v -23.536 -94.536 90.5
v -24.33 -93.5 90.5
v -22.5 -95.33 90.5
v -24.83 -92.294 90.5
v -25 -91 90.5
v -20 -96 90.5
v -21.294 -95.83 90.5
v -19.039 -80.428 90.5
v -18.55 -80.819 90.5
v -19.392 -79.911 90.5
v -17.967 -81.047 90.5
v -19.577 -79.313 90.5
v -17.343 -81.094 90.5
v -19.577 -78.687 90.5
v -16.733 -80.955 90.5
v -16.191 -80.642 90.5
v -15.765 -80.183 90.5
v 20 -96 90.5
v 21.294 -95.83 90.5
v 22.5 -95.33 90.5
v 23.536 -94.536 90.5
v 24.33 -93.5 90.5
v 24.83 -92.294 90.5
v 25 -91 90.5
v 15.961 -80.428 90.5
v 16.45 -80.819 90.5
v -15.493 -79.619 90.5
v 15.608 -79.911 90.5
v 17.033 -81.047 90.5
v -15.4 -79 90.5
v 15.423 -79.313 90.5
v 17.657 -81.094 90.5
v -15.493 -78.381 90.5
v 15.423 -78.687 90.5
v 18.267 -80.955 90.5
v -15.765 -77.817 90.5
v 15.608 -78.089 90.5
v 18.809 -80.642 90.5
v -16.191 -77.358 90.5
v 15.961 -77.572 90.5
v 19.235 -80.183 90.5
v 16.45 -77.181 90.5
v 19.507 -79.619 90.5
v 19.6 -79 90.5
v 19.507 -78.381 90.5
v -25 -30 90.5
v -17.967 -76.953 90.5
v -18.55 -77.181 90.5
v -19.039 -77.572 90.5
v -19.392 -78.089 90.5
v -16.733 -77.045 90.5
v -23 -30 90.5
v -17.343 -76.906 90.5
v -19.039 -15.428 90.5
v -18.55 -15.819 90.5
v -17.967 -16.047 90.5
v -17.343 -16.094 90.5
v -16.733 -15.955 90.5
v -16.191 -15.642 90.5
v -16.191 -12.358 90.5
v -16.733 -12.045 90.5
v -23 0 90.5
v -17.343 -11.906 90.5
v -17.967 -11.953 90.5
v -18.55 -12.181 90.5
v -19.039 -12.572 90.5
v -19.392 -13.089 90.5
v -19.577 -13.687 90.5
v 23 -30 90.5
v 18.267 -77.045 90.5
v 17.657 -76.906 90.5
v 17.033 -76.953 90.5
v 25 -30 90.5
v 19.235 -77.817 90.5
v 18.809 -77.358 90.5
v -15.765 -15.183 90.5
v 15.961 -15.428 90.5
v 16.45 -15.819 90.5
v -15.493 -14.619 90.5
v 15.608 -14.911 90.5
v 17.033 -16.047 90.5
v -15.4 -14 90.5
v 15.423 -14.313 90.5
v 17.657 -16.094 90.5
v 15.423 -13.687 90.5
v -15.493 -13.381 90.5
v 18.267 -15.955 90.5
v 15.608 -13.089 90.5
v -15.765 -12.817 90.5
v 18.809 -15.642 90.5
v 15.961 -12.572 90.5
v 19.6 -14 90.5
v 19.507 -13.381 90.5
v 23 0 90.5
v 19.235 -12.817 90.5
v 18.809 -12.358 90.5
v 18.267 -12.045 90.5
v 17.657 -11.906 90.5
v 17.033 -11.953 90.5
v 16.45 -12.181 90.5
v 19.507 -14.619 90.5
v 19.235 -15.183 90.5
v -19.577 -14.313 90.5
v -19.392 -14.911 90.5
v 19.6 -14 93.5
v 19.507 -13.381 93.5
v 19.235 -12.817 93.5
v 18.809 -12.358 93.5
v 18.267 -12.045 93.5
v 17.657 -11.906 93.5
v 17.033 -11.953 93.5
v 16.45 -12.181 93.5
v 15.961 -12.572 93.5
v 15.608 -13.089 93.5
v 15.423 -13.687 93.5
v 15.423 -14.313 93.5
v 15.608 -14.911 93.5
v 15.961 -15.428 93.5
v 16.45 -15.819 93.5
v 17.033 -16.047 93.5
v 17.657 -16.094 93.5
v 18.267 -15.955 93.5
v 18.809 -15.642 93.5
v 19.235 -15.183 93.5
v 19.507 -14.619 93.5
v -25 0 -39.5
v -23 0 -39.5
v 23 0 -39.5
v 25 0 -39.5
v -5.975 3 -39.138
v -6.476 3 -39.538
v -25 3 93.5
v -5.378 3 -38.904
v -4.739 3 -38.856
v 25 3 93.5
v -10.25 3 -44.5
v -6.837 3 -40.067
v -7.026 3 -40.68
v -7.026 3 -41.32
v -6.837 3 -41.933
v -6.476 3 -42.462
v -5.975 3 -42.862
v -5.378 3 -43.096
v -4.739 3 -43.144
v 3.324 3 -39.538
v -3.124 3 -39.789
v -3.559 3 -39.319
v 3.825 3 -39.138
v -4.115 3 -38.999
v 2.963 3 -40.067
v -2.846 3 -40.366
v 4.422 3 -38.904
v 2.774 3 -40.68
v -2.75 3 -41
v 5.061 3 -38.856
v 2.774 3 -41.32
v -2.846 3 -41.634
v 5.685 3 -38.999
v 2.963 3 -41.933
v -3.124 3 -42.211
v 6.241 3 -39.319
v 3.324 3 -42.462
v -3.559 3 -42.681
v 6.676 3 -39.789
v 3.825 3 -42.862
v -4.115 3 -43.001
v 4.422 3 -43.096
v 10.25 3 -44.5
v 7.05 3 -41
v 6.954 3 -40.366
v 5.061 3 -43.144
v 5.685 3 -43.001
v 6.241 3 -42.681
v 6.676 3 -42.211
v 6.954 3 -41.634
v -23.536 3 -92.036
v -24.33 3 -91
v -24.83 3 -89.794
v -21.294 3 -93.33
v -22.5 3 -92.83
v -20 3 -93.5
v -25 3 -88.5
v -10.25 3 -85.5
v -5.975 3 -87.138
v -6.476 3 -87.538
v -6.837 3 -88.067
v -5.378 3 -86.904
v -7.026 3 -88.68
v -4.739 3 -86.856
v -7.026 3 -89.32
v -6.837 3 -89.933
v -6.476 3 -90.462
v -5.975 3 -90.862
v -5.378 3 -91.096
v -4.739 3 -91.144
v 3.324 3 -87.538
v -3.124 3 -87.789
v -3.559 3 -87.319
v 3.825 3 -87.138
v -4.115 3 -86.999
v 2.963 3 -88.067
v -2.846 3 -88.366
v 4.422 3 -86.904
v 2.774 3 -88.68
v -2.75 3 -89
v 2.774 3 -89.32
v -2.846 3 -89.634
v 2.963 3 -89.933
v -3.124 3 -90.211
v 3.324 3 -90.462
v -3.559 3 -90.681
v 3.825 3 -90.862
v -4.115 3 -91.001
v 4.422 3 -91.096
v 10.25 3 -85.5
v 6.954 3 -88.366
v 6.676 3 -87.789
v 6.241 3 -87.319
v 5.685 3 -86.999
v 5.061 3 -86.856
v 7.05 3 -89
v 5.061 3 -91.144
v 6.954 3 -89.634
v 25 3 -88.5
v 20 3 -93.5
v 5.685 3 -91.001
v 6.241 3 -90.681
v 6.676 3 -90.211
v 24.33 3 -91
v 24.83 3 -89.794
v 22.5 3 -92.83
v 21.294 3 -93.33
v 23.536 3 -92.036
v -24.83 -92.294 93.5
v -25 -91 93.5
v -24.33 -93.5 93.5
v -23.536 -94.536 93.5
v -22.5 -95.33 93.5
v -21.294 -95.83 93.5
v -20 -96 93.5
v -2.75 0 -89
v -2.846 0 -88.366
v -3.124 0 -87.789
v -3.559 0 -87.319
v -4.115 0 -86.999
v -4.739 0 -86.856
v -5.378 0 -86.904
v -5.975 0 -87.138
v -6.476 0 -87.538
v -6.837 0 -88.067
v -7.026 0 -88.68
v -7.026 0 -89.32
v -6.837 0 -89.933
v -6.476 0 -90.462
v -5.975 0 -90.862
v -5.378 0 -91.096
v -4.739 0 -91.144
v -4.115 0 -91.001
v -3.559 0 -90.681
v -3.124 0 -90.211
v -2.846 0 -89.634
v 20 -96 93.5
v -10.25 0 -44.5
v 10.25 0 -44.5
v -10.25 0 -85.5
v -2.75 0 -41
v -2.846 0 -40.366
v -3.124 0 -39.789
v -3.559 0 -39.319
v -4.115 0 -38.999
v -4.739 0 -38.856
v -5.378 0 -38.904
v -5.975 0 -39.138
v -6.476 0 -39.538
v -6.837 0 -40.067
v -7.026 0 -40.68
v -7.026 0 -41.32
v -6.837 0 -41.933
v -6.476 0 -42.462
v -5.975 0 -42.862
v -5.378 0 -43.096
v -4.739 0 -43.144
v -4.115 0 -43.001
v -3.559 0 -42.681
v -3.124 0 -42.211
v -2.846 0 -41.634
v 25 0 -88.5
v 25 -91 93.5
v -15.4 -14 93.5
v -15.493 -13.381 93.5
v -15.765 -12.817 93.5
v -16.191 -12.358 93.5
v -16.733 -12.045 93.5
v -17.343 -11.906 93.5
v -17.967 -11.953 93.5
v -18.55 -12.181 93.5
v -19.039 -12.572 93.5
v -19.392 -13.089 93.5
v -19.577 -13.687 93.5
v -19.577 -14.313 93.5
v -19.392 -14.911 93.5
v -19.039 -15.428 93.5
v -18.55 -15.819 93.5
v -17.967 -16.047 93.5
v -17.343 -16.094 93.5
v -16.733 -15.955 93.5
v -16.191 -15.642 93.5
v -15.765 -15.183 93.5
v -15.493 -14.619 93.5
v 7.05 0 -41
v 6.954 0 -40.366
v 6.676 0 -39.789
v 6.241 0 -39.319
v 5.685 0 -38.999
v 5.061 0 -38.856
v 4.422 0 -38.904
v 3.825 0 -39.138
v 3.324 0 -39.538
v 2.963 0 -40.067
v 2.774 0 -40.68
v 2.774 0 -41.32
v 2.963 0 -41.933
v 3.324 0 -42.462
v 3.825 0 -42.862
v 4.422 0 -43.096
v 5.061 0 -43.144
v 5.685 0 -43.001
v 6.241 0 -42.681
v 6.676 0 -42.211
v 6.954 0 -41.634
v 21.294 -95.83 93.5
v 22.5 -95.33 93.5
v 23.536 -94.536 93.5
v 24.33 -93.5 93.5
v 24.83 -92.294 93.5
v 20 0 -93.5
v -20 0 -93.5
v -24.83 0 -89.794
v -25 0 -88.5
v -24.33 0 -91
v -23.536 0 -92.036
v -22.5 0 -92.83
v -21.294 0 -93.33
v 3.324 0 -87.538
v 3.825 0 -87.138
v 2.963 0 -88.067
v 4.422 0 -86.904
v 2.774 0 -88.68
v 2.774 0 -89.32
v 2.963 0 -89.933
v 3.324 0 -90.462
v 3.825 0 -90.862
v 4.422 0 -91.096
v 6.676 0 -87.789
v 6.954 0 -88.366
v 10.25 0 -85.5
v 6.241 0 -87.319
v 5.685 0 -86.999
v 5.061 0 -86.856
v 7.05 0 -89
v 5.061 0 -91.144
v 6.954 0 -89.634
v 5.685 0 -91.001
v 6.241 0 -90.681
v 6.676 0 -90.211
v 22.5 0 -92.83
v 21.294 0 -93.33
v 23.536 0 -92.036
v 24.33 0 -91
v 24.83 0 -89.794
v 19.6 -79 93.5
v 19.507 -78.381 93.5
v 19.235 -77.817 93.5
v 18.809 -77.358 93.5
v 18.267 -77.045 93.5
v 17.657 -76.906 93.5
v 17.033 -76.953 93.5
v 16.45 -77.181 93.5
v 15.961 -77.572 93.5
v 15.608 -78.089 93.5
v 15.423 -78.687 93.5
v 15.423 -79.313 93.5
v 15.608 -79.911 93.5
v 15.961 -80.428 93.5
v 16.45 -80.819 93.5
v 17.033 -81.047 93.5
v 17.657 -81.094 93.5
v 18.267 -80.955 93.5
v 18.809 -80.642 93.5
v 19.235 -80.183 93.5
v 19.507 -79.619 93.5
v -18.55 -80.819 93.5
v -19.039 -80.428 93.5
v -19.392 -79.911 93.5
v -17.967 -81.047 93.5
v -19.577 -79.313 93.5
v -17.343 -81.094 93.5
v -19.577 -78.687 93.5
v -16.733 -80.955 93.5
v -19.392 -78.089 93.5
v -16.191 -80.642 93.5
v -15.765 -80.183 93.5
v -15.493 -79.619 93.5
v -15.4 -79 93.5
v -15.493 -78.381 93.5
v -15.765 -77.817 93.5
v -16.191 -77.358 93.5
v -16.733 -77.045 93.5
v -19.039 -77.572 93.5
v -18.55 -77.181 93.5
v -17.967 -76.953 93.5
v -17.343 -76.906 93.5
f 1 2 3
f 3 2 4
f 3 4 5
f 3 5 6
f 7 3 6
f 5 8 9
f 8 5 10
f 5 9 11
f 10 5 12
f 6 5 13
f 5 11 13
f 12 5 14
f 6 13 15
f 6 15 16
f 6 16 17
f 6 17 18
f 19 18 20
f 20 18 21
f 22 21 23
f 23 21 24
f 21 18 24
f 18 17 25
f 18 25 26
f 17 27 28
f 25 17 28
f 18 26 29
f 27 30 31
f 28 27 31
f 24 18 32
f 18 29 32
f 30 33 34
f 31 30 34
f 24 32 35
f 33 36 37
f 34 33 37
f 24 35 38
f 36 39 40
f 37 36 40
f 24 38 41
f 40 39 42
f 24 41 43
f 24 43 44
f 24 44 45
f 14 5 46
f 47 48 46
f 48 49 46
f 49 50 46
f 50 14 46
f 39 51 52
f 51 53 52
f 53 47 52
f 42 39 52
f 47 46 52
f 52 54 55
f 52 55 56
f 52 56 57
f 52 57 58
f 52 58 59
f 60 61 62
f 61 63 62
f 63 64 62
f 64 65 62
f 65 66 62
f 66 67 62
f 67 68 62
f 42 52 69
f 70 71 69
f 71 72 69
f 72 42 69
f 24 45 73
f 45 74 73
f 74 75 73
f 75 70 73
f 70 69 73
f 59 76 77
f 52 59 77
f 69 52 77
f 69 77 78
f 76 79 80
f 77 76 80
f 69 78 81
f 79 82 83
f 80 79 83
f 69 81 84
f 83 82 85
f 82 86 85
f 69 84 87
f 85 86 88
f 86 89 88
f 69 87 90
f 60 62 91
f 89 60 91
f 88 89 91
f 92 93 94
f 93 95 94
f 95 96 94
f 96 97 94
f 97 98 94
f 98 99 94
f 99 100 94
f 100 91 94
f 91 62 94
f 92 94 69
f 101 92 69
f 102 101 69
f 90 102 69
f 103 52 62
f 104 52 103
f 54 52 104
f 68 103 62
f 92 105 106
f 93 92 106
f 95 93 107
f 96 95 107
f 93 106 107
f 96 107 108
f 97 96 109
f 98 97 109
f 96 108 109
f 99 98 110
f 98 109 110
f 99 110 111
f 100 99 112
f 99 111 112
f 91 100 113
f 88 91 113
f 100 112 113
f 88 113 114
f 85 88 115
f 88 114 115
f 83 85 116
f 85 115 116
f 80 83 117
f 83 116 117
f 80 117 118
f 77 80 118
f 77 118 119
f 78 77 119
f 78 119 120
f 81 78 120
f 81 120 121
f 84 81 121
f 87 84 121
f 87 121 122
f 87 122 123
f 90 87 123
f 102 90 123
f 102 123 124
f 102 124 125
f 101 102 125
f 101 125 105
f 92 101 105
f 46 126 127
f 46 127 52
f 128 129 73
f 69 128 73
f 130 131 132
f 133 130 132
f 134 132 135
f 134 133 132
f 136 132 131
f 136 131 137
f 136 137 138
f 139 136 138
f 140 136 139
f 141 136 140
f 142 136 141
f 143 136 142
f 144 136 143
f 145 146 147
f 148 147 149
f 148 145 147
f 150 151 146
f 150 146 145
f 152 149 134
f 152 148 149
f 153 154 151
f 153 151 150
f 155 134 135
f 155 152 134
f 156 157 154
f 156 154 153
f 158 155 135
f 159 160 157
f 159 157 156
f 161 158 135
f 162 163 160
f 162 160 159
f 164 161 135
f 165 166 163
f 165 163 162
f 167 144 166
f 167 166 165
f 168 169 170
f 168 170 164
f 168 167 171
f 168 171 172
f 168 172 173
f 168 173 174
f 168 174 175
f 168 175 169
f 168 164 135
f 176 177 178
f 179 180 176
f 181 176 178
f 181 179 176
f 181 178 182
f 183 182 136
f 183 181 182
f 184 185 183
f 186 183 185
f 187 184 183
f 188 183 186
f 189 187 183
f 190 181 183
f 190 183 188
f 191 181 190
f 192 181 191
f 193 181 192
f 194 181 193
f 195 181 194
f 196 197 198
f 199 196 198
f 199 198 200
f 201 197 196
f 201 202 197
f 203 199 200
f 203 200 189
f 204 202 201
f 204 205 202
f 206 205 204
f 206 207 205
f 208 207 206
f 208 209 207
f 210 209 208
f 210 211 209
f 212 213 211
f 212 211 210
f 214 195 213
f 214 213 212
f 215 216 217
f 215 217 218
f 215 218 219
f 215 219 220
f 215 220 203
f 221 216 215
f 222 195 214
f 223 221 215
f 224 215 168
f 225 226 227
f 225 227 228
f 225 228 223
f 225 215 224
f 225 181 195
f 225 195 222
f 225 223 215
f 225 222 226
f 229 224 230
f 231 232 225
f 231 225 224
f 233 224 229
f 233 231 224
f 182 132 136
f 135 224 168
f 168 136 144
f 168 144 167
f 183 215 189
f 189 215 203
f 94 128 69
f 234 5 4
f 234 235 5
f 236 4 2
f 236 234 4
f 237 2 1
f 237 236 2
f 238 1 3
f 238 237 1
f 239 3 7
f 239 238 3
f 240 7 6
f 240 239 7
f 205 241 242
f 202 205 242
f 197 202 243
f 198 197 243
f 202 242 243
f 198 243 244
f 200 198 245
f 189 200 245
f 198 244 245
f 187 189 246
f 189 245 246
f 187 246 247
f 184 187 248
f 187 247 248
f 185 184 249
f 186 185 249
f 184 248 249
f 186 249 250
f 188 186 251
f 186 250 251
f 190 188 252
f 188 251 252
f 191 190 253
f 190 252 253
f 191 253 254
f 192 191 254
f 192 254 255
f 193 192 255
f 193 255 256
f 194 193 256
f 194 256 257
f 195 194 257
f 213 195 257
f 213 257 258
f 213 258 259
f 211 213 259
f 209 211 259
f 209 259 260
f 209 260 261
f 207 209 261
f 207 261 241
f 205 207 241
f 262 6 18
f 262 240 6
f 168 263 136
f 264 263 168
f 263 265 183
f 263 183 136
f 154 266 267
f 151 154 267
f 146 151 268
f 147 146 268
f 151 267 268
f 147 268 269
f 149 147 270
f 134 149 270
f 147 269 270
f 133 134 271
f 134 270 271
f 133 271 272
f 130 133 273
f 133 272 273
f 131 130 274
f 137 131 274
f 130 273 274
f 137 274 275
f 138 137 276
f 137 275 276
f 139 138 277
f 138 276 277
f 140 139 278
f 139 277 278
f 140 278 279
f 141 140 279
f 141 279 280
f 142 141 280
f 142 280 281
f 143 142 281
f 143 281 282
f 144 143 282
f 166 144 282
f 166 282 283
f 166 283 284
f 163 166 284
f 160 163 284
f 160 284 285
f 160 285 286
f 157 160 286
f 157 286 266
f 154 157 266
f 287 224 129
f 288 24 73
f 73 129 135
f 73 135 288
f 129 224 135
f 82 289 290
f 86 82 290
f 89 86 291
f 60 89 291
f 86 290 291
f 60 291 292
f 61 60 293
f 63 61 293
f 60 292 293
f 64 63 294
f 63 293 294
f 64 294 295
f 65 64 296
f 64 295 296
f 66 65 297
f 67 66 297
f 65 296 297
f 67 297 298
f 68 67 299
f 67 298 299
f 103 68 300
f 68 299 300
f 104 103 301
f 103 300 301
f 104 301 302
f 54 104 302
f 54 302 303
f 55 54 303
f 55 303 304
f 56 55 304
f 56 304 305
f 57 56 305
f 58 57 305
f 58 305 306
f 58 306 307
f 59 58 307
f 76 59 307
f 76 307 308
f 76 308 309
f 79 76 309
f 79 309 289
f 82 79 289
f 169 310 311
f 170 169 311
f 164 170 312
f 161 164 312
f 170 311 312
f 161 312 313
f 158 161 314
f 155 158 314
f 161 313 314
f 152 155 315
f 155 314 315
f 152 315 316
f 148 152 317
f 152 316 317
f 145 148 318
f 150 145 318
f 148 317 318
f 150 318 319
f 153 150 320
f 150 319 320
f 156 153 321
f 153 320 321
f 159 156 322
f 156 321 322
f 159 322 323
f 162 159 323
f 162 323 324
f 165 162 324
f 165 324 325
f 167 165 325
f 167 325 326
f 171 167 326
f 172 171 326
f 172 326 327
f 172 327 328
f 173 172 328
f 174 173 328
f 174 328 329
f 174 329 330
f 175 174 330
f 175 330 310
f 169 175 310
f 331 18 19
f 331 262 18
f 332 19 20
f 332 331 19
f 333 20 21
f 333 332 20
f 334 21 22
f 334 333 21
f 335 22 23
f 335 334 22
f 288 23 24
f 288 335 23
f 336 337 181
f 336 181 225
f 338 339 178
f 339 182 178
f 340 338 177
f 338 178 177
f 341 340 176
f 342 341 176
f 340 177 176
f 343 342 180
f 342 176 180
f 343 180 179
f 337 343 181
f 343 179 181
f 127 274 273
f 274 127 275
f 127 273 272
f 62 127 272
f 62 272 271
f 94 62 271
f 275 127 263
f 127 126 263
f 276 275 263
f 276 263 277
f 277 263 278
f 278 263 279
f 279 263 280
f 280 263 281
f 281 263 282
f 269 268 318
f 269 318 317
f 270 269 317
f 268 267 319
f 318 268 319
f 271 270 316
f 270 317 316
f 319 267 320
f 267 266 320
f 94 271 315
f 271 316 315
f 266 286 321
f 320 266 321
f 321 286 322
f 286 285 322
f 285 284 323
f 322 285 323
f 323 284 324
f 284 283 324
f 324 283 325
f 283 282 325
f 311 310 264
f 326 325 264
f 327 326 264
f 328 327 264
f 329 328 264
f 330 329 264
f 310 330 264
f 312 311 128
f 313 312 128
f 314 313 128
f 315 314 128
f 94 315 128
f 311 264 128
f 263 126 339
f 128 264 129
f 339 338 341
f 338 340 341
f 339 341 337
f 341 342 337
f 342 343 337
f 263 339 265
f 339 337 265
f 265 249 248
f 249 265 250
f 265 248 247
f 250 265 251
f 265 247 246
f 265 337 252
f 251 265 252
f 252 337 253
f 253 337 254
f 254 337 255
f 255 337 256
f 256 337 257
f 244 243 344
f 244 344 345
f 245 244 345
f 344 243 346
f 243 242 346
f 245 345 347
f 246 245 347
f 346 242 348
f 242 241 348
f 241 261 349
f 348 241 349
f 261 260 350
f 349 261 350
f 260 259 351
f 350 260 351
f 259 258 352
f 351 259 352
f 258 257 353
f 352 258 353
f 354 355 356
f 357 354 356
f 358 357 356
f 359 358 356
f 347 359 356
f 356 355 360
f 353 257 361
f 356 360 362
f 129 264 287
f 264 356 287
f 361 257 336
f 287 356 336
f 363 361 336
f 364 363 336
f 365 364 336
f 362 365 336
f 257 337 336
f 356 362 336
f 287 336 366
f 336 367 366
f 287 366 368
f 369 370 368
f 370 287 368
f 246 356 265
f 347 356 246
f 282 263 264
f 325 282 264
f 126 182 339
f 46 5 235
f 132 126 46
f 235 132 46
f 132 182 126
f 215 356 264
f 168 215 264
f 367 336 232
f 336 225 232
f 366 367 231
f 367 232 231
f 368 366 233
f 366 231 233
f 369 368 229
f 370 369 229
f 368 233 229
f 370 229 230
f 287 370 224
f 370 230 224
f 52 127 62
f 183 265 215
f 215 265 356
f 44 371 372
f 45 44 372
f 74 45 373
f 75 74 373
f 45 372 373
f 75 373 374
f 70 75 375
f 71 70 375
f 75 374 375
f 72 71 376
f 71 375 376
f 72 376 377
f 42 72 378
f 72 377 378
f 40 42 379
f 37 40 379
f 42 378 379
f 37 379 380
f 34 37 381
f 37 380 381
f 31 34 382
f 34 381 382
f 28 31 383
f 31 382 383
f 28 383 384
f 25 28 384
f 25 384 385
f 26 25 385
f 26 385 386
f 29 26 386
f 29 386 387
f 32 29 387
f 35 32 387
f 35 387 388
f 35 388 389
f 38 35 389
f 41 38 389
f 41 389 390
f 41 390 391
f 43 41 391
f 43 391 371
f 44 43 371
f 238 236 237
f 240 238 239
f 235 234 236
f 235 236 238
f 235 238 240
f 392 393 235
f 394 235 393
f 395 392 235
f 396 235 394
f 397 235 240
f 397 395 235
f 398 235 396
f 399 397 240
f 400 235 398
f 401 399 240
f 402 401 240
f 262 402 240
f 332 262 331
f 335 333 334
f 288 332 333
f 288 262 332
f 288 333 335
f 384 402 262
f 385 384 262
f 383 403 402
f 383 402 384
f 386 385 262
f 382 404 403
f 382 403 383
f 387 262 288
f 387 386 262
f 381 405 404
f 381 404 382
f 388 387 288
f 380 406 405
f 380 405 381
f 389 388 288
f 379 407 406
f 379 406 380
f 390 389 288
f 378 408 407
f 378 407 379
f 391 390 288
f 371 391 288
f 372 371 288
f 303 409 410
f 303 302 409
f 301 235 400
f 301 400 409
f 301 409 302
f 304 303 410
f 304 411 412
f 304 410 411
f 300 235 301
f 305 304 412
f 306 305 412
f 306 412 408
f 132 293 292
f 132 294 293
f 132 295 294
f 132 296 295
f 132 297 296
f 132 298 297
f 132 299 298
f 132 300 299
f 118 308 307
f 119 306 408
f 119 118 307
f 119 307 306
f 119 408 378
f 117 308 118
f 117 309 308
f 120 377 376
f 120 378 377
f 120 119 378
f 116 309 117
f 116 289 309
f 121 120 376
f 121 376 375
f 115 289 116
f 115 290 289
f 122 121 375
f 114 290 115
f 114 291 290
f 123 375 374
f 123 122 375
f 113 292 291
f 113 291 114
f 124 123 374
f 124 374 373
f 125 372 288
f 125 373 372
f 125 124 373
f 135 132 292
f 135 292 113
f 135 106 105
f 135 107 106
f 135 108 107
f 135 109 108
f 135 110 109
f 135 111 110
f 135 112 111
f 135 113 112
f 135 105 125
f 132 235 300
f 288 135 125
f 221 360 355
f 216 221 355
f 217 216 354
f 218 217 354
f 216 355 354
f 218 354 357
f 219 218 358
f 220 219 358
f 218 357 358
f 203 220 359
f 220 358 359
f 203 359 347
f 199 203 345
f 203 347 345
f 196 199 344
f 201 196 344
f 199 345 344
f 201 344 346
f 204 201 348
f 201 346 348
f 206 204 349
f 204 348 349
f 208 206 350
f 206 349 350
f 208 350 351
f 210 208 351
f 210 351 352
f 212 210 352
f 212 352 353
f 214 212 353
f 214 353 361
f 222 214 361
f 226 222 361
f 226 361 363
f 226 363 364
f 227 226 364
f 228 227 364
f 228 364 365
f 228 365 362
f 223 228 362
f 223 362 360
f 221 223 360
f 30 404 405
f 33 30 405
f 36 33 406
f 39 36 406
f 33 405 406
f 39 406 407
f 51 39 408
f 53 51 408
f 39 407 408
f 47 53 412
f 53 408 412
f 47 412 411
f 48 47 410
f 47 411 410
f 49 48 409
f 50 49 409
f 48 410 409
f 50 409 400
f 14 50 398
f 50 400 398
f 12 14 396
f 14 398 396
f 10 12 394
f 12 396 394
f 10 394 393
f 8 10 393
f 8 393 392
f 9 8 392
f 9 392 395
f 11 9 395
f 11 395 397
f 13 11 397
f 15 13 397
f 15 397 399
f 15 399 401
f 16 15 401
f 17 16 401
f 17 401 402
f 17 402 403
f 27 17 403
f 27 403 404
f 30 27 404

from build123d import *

# Parameters (mm, degrees)
SKETCH_1_W          = 50
SKETCH_1_H          = 187
EXTRUDE_1_DEPTH     = 3
SKETCH_4_R          = 2.15
SKETCH_4_W          = 20.5
SKETCH_4_H          = 41
CUT_EXTRUDE_2_DEPTH = 4
SKETCH_5_W          = 50
SKETCH_5_H          = 3
EXTRUDE_2_DEPTH     = 96
SKETCH_6_R          = 2.1
CUT_EXTRUDE_3_DEPTH = 188
FILLET_1_R          = 5
EXTRUDE_3_DEPTH     = 2
EXTRUDE_4_DEPTH     = 2


with BuildPart() as part:
    # 草图1 → 凸台-拉伸1 (new body)
    with BuildSketch(Plane(origin=(0, 0, 0), x_dir=(1, 0, 0), z_dir=(0, 1, 0))):
        Rectangle(SKETCH_1_W, SKETCH_1_H)
    extrude(amount=EXTRUDE_1_DEPTH)

    # 草图4 → 切除-拉伸2 (cut, through all)
    with BuildSketch(Plane.XZ):
        with Locations((-4.9, -89)):
            Circle(SKETCH_4_R)
        with Locations((4.9, -89)):
            Circle(SKETCH_4_R)
        with Locations((4.9, -41)):
            Circle(SKETCH_4_R)
        with Locations((-4.9, -41)):
            Circle(SKETCH_4_R)
        with Locations((0, -65)):
            Rectangle(SKETCH_4_W, SKETCH_4_H)
    extrude(amount=-CUT_EXTRUDE_2_DEPTH, mode=Mode.SUBTRACT)

    # 草图5 → 凸台-拉伸2 (add)
    with BuildSketch(Plane.XZ):
        with Locations((0, 92)):
            Rectangle(SKETCH_5_W, SKETCH_5_H)
    extrude(amount=EXTRUDE_2_DEPTH)

    # 草图6 → 切除-拉伸3 (cut, through all)
    with BuildSketch(Plane.XY.offset(93.5)):
        with Locations((-17.5, -14)):
            Circle(SKETCH_6_R)
        with Locations((17.5, -14)):
            Circle(SKETCH_6_R)
        with Locations((17.5, -79)):
            Circle(SKETCH_6_R)
        with Locations((-17.5, -79)):
            Circle(SKETCH_6_R)
    extrude(amount=-CUT_EXTRUDE_3_DEPTH, mode=Mode.SUBTRACT)

    # 圆角1
    fillet_1_edges = [part.edges().sort_by_distance(p)[0] for p in [
        (-25, -96, 92),
        (25, -96, 92),
        (-25, 1.5, -93.5),
        (25, 1.5, -93.5),
    ]]
    fillet(fillet_1_edges, radius=FILLET_1_R)

    # 草图7 → 凸台-拉伸3 (add)
    with BuildSketch(Plane(origin=(25, 0, 0), x_dir=(0, 0, -1), z_dir=(1, 0, 0))):
        Polygon((39.5, 0), (-90.5, -30), (-90.5, 0), align=None)
    extrude(amount=-EXTRUDE_3_DEPTH)

    # 草图9 → 凸台-拉伸4 (add)
    with BuildSketch(Plane.ZY.offset(25)):
        Polygon((-39.5, 0), (90.5, -30), (90.5, 0), align=None)
    extrude(amount=-EXTRUDE_4_DEPTH)


solid = part.part
